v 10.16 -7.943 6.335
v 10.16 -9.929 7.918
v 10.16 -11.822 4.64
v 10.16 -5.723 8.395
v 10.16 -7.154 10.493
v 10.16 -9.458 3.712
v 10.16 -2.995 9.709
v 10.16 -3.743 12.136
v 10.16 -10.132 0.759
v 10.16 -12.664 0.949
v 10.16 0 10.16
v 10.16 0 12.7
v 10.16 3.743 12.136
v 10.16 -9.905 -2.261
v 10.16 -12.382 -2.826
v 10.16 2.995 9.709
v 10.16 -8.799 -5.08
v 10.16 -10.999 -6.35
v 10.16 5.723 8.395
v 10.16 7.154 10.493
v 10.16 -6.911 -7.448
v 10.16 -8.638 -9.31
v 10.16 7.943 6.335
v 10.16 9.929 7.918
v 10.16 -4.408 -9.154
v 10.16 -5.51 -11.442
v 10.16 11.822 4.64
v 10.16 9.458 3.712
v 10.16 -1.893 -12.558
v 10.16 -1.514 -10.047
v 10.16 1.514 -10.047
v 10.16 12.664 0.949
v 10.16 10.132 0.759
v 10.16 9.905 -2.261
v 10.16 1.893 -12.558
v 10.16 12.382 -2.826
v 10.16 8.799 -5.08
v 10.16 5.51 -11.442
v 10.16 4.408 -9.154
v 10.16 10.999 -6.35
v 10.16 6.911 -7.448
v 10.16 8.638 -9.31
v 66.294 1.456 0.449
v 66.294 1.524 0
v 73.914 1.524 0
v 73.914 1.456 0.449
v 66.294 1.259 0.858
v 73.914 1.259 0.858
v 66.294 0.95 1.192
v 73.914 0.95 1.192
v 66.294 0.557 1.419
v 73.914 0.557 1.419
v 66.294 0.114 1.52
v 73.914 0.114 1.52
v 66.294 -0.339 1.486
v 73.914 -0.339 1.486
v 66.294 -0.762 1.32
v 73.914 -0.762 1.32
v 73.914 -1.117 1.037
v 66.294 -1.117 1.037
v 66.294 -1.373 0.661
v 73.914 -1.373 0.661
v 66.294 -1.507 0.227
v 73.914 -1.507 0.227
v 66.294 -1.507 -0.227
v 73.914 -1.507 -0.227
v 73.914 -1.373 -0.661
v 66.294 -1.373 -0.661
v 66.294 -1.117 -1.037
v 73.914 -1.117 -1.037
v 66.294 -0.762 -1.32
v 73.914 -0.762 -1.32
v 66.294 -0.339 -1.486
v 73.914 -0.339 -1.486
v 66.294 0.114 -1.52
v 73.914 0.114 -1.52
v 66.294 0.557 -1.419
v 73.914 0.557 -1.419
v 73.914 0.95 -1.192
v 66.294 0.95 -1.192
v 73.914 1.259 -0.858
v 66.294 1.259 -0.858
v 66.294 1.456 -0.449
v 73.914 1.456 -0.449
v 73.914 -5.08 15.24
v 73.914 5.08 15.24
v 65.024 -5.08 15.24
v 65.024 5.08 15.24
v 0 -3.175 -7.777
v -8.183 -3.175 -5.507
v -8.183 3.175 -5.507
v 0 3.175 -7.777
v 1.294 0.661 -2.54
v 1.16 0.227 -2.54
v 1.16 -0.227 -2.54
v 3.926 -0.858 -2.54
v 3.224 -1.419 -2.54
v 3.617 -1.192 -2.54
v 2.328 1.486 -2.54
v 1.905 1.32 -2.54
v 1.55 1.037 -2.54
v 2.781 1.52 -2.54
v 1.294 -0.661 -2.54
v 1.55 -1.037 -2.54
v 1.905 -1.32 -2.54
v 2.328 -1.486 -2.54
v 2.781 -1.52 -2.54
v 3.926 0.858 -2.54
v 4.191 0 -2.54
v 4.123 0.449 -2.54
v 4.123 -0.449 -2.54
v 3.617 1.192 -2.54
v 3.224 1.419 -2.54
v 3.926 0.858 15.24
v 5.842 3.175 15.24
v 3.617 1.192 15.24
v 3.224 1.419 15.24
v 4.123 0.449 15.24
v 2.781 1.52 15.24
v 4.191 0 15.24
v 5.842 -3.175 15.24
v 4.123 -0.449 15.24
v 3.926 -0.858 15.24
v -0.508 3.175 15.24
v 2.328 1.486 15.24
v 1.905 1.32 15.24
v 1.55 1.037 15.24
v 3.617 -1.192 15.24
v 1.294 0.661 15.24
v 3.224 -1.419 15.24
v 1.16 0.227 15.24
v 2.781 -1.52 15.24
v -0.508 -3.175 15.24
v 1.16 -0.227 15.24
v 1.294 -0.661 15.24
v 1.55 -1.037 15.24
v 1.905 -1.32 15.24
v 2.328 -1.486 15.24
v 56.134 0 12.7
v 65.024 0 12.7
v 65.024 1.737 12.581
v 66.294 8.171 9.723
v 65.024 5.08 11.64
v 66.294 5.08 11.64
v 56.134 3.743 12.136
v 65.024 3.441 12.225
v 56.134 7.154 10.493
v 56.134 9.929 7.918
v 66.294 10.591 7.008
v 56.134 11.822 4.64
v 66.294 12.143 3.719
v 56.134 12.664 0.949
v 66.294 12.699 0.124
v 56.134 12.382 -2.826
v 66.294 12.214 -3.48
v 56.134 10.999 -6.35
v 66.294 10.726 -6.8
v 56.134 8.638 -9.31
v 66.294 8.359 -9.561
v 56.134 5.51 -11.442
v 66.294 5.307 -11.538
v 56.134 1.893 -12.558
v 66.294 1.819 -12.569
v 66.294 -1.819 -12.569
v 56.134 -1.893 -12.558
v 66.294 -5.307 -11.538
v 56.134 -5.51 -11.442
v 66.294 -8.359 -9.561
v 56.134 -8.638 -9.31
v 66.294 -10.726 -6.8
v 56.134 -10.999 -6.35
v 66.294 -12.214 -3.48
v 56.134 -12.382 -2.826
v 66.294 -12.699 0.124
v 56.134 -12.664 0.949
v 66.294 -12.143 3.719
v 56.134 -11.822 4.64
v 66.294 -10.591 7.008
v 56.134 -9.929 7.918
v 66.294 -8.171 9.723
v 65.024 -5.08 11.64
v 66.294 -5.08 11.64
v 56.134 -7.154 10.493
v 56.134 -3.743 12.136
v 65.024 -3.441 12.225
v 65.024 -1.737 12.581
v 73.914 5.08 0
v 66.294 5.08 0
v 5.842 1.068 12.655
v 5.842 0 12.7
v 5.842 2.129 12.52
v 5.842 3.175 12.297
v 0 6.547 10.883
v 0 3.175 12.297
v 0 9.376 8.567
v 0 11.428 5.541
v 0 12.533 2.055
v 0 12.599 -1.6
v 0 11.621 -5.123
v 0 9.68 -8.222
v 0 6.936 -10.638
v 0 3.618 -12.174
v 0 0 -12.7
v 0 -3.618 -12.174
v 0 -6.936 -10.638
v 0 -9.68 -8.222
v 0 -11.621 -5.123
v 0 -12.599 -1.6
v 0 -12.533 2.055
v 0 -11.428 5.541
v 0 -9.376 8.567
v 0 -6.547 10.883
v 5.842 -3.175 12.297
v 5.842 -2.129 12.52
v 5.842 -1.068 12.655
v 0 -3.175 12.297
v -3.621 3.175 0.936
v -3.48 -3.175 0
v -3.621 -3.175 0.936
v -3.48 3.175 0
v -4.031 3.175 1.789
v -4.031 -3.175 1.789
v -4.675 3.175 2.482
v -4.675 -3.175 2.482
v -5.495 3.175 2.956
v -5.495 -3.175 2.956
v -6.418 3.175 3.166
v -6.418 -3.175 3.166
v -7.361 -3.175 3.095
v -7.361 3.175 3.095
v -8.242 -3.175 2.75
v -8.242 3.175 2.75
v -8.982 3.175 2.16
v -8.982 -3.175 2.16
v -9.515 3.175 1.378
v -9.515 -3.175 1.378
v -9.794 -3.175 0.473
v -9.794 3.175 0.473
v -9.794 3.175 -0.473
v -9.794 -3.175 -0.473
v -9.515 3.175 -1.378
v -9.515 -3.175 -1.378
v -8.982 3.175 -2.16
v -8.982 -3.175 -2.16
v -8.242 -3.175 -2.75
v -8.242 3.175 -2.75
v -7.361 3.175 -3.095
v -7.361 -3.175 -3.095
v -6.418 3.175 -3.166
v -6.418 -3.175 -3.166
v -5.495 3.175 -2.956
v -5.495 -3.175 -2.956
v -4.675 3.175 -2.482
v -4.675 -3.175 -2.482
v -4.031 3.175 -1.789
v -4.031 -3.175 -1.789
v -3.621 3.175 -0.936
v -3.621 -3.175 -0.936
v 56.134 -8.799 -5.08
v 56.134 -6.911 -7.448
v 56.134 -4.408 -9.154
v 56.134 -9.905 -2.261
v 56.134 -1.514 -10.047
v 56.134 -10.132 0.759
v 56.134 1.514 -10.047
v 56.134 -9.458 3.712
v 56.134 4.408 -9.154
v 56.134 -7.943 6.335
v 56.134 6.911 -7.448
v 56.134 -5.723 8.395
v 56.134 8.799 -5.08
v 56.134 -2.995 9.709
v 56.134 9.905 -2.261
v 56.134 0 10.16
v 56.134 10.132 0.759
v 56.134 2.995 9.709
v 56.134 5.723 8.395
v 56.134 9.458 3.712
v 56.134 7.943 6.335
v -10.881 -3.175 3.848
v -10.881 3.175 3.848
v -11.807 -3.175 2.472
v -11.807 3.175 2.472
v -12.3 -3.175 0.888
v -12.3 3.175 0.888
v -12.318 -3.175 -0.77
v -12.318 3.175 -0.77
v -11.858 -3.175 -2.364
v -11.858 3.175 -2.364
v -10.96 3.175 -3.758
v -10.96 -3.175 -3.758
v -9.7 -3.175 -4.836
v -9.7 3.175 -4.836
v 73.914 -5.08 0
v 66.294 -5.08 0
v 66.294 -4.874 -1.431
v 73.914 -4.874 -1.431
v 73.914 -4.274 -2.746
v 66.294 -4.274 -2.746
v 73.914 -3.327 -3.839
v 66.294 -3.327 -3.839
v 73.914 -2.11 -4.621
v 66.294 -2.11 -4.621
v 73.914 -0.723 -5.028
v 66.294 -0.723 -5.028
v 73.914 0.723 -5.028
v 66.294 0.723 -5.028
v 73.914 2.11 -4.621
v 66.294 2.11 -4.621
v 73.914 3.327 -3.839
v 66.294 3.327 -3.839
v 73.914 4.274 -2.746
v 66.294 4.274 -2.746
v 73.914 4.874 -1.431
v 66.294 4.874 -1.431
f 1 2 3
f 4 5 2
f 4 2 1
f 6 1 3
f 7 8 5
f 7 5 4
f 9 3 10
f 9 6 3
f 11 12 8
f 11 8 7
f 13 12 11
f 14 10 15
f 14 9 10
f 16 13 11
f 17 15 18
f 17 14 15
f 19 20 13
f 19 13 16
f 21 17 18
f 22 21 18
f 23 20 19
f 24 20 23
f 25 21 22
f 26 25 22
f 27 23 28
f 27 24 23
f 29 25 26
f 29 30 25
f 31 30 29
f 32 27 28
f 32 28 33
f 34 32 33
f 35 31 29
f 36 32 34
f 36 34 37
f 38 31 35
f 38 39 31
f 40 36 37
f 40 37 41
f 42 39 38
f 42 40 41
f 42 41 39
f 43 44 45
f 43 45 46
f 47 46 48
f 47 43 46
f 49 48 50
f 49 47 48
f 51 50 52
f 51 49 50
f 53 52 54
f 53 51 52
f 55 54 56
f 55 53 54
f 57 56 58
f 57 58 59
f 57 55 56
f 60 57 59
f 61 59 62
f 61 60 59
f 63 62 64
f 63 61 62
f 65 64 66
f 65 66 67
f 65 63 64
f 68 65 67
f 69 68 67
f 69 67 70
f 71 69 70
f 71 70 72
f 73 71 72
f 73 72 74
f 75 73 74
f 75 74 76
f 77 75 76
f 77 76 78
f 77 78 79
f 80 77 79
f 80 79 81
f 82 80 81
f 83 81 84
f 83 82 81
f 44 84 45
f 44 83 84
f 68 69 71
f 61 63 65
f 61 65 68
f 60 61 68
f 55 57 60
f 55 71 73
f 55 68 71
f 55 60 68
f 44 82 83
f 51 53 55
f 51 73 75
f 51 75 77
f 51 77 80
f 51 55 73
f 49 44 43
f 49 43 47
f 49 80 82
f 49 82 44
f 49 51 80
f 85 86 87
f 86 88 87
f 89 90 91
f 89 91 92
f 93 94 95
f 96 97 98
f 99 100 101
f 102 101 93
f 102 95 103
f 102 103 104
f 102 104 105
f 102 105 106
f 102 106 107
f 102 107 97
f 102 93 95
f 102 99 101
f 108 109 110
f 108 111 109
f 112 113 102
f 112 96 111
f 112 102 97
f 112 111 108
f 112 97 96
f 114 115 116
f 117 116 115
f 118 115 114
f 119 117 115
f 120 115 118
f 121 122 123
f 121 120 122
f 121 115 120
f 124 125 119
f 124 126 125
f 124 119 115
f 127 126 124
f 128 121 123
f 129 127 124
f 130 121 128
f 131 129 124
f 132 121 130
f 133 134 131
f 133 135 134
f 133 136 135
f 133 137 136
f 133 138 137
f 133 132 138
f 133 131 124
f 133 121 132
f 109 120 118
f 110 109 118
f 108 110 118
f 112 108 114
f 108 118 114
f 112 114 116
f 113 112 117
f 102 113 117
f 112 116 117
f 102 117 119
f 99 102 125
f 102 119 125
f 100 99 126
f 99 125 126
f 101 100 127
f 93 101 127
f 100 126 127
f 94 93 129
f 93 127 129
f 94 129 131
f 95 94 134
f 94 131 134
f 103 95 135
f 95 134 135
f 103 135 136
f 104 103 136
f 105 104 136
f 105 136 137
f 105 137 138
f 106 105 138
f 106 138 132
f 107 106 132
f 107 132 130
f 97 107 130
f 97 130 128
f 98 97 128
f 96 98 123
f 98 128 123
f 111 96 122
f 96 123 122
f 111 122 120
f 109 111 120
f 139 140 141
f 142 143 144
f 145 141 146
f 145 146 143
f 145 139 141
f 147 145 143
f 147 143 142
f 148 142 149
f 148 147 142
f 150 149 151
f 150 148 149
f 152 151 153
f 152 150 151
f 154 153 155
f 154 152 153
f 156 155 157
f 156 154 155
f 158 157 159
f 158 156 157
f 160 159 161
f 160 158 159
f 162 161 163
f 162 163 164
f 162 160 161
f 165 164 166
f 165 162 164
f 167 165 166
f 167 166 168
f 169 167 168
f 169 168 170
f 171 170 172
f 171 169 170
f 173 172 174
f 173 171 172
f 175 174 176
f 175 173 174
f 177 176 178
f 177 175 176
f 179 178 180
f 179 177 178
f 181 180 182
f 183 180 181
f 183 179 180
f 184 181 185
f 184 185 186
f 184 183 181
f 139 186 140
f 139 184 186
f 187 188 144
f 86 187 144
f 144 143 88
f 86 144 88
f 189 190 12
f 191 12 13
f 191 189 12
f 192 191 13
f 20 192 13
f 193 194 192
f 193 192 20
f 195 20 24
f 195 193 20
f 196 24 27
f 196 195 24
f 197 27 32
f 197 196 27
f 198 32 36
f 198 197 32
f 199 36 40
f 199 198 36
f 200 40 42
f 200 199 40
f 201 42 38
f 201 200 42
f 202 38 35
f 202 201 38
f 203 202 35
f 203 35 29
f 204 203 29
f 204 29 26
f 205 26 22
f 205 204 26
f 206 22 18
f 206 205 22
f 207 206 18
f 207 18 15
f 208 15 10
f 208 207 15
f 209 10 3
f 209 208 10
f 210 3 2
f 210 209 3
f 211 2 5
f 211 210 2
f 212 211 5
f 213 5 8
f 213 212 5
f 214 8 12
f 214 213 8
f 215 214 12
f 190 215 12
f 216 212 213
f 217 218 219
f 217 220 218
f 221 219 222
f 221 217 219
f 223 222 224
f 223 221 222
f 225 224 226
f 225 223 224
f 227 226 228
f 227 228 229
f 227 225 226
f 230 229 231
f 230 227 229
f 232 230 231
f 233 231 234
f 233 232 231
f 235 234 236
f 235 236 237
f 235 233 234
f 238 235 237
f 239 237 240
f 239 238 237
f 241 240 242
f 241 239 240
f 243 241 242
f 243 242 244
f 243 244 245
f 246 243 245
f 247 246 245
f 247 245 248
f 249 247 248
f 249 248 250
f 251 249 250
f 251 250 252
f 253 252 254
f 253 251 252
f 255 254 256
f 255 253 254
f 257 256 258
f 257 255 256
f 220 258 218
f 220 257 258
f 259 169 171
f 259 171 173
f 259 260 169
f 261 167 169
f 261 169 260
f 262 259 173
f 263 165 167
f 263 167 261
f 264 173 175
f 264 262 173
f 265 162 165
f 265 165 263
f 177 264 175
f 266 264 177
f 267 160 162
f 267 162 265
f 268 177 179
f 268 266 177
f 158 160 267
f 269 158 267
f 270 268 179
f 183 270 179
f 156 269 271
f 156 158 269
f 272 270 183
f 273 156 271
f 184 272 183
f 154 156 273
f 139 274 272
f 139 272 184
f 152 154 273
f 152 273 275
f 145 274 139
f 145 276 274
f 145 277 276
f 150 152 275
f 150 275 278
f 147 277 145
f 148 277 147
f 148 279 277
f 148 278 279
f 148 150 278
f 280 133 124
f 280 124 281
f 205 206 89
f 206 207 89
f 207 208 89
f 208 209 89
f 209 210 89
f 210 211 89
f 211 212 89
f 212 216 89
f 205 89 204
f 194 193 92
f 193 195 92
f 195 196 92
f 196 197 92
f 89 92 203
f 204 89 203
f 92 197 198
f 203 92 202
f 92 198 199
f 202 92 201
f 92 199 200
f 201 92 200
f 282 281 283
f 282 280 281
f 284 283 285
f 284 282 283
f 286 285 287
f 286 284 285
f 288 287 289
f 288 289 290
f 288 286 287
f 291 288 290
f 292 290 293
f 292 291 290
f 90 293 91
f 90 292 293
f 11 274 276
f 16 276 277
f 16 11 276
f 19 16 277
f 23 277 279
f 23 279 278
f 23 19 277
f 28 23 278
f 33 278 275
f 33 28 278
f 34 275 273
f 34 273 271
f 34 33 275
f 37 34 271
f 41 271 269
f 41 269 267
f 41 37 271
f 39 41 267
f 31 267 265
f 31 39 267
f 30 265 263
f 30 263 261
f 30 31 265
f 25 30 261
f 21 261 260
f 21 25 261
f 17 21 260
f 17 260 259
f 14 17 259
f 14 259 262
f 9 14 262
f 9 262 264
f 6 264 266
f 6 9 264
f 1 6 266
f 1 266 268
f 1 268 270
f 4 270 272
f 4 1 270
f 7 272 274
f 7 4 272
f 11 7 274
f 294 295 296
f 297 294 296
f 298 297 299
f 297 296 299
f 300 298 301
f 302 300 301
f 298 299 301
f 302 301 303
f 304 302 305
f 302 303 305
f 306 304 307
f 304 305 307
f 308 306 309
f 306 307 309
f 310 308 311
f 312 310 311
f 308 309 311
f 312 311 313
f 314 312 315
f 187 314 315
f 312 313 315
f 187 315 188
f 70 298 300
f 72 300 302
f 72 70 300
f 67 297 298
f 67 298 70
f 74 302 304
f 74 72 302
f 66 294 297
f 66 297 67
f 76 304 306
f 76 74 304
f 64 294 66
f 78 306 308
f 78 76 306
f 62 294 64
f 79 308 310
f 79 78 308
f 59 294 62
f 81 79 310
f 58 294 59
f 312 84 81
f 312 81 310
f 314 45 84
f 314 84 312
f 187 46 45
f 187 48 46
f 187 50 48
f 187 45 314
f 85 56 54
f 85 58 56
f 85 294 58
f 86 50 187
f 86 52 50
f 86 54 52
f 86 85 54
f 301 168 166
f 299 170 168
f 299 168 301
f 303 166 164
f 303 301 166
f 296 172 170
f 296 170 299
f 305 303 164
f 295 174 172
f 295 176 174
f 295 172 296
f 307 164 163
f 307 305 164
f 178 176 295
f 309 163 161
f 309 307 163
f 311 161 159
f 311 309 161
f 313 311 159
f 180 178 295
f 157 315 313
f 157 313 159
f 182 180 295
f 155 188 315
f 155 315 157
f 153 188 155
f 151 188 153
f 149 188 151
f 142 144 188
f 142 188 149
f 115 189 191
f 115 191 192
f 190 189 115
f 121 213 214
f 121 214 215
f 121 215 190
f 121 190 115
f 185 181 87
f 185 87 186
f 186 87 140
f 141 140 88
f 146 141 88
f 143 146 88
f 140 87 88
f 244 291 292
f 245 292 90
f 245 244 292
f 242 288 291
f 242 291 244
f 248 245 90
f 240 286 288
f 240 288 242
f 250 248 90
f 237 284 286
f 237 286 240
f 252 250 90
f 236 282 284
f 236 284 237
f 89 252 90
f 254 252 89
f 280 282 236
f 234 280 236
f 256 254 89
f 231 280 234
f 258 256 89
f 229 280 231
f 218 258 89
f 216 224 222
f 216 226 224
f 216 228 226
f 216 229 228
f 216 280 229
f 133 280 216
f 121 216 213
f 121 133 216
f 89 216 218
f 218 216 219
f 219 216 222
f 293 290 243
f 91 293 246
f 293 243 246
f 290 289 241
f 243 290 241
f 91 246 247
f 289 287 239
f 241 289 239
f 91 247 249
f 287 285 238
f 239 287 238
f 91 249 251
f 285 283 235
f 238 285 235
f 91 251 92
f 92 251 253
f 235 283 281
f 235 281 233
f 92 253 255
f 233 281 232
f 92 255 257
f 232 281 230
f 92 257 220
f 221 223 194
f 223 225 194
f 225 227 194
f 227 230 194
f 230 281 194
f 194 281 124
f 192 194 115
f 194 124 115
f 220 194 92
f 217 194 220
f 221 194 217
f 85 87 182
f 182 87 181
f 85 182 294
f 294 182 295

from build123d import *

# Parameters (mm, degrees)
F0_W      = 5.842
F0_H      = 12.7
F0_R      = 3.175
F2_DEPTH  = 3.175
F5_DEPTH  = 1.27
F4_R      = 1.524
F6_DEPTH  = 7.62
F10_R     = 1.524
F11_DEPTH = 17.78


# Not quite as in the source:
# - a feature of the source that left no trace in its solid (it failed there, or was rolled back) is left out


with BuildPart() as f1:
    # F0 (on Front) → F1 (revolve)
    with BuildSketch(Plane.XZ):
        Polygon((5.842, 12.7), (5.842, 0), (66.294, 0), (66.294, 12.7), (56.134, 12.7), (56.134, 10.16), (10.16, 10.16), (10.16, 12.7), align=None)
        with Locations((2.921, 6.35)):
            Rectangle(F0_W, F0_H)
    revolve(axis=Axis((33.147, 0, 0), (-1, 0, 0)))

    # F0 (on Front) → F2 (join, symmetric)
    with BuildSketch(Plane.XZ):
        with BuildLine():
            Line((5.842, 0), (0, 0))
            Line((0, 0), (-0.9398, 0))
            ThreePointArc((-0.9398, 0), (-3.1957909266, -4.5493385486), (-8.1826630726, -5.5069827884))
            Line((-8.1826630726, -5.5069827884), (5.842, -9.398))
            Line((5.842, -9.398), (5.842, 0))
        make_face()
        with BuildLine():
            Line((-0.9398, 0), (0, 0))
            Line((0, 0), (0, 12.7))
            Line((0, 12.7), (5.842, 12.7))
            Line((5.842, 12.7), (5.842, 15.24))
            Line((5.842, 15.24), (-0.508, 15.24))
            Line((-0.508, 15.24), (-10.8806298187, 3.8475430269))
            ThreePointArc((-10.8806298187, 3.8475430269), (-4.5919612295, 5.3297205562), (-0.9398, 0))
        make_face()
        with BuildLine():
            ThreePointArc((-8.1826630726, -5.5069827884), (-3.1957909266, -4.5493385486), (-0.9398, 0))
            ThreePointArc((-0.9398, 0), (-4.5919612295, 5.3297205562), (-10.8806298187, 3.8475430269))
            ThreePointArc((-10.8806298187, 3.8475430269), (-12.1459778134, -1.5837270034), (-8.1826630726, -5.5069827884))
        make_face()
        with Locations((-6.6548, 0)):
            Circle(F0_R, mode=Mode.SUBTRACT)
        with Locations((2.921, 6.35)):
            Rectangle(F0_W, F0_H)
    extrude(amount=F2_DEPTH, both=True)

    # F3: union 

    # F4 (on face) → F5 (join)
    with BuildSketch(Plane.YZ.offset(66.294)):
        with BuildLine():
            ThreePointArc((-5.08, 11.6397422652), (0, 12.7), (5.08, 11.6397422652))
            Line((5.08, 11.6397422652), (5.08, 15.24))
            Line((5.08, 15.24), (-5.08, 15.24))
            Line((-5.08, 15.24), (-5.08, 11.6397422652))
        make_face()
    extrude(amount=-F5_DEPTH)

    # F4 (on face) → F6 (join)
    with BuildSketch(Plane.YZ.offset(66.294)):
        with BuildLine():
            Line((5.08, 0), (5.08, 11.6397422652))
            ThreePointArc((5.08, 11.6397422652), (0, 12.7), (-5.08, 11.6397422652))
            Line((-5.08, 11.6397422652), (-5.08, 0))
            ThreePointArc((-5.08, 0), (0, 5.08), (5.08, 0))
        make_face()
        with BuildLine():
            ThreePointArc((-5.08, 11.6397422652), (0, 12.7), (5.08, 11.6397422652))
            Line((5.08, 11.6397422652), (5.08, 15.24))
            Line((5.08, 15.24), (-5.08, 15.24))
            Line((-5.08, 15.24), (-5.08, 11.6397422652))
        make_face()
        with BuildLine():
            ThreePointArc((-5.08, 0), (0, -5.08), (5.08, 0))
            ThreePointArc((5.08, 0), (0, 5.08), (-5.08, 0))
        make_face()
        Circle(F4_R, mode=Mode.SUBTRACT)
    extrude(amount=F6_DEPTH)

    # F7: union 

    # F10 (on face) → F11 (cut)
    with BuildSketch(Plane.XY.offset(15.24)):
        with Locations((2.667, 0)):
            Circle(F10_R)
    extrude(amount=-F11_DEPTH, mode=Mode.SUBTRACT)


solid = f1.part
